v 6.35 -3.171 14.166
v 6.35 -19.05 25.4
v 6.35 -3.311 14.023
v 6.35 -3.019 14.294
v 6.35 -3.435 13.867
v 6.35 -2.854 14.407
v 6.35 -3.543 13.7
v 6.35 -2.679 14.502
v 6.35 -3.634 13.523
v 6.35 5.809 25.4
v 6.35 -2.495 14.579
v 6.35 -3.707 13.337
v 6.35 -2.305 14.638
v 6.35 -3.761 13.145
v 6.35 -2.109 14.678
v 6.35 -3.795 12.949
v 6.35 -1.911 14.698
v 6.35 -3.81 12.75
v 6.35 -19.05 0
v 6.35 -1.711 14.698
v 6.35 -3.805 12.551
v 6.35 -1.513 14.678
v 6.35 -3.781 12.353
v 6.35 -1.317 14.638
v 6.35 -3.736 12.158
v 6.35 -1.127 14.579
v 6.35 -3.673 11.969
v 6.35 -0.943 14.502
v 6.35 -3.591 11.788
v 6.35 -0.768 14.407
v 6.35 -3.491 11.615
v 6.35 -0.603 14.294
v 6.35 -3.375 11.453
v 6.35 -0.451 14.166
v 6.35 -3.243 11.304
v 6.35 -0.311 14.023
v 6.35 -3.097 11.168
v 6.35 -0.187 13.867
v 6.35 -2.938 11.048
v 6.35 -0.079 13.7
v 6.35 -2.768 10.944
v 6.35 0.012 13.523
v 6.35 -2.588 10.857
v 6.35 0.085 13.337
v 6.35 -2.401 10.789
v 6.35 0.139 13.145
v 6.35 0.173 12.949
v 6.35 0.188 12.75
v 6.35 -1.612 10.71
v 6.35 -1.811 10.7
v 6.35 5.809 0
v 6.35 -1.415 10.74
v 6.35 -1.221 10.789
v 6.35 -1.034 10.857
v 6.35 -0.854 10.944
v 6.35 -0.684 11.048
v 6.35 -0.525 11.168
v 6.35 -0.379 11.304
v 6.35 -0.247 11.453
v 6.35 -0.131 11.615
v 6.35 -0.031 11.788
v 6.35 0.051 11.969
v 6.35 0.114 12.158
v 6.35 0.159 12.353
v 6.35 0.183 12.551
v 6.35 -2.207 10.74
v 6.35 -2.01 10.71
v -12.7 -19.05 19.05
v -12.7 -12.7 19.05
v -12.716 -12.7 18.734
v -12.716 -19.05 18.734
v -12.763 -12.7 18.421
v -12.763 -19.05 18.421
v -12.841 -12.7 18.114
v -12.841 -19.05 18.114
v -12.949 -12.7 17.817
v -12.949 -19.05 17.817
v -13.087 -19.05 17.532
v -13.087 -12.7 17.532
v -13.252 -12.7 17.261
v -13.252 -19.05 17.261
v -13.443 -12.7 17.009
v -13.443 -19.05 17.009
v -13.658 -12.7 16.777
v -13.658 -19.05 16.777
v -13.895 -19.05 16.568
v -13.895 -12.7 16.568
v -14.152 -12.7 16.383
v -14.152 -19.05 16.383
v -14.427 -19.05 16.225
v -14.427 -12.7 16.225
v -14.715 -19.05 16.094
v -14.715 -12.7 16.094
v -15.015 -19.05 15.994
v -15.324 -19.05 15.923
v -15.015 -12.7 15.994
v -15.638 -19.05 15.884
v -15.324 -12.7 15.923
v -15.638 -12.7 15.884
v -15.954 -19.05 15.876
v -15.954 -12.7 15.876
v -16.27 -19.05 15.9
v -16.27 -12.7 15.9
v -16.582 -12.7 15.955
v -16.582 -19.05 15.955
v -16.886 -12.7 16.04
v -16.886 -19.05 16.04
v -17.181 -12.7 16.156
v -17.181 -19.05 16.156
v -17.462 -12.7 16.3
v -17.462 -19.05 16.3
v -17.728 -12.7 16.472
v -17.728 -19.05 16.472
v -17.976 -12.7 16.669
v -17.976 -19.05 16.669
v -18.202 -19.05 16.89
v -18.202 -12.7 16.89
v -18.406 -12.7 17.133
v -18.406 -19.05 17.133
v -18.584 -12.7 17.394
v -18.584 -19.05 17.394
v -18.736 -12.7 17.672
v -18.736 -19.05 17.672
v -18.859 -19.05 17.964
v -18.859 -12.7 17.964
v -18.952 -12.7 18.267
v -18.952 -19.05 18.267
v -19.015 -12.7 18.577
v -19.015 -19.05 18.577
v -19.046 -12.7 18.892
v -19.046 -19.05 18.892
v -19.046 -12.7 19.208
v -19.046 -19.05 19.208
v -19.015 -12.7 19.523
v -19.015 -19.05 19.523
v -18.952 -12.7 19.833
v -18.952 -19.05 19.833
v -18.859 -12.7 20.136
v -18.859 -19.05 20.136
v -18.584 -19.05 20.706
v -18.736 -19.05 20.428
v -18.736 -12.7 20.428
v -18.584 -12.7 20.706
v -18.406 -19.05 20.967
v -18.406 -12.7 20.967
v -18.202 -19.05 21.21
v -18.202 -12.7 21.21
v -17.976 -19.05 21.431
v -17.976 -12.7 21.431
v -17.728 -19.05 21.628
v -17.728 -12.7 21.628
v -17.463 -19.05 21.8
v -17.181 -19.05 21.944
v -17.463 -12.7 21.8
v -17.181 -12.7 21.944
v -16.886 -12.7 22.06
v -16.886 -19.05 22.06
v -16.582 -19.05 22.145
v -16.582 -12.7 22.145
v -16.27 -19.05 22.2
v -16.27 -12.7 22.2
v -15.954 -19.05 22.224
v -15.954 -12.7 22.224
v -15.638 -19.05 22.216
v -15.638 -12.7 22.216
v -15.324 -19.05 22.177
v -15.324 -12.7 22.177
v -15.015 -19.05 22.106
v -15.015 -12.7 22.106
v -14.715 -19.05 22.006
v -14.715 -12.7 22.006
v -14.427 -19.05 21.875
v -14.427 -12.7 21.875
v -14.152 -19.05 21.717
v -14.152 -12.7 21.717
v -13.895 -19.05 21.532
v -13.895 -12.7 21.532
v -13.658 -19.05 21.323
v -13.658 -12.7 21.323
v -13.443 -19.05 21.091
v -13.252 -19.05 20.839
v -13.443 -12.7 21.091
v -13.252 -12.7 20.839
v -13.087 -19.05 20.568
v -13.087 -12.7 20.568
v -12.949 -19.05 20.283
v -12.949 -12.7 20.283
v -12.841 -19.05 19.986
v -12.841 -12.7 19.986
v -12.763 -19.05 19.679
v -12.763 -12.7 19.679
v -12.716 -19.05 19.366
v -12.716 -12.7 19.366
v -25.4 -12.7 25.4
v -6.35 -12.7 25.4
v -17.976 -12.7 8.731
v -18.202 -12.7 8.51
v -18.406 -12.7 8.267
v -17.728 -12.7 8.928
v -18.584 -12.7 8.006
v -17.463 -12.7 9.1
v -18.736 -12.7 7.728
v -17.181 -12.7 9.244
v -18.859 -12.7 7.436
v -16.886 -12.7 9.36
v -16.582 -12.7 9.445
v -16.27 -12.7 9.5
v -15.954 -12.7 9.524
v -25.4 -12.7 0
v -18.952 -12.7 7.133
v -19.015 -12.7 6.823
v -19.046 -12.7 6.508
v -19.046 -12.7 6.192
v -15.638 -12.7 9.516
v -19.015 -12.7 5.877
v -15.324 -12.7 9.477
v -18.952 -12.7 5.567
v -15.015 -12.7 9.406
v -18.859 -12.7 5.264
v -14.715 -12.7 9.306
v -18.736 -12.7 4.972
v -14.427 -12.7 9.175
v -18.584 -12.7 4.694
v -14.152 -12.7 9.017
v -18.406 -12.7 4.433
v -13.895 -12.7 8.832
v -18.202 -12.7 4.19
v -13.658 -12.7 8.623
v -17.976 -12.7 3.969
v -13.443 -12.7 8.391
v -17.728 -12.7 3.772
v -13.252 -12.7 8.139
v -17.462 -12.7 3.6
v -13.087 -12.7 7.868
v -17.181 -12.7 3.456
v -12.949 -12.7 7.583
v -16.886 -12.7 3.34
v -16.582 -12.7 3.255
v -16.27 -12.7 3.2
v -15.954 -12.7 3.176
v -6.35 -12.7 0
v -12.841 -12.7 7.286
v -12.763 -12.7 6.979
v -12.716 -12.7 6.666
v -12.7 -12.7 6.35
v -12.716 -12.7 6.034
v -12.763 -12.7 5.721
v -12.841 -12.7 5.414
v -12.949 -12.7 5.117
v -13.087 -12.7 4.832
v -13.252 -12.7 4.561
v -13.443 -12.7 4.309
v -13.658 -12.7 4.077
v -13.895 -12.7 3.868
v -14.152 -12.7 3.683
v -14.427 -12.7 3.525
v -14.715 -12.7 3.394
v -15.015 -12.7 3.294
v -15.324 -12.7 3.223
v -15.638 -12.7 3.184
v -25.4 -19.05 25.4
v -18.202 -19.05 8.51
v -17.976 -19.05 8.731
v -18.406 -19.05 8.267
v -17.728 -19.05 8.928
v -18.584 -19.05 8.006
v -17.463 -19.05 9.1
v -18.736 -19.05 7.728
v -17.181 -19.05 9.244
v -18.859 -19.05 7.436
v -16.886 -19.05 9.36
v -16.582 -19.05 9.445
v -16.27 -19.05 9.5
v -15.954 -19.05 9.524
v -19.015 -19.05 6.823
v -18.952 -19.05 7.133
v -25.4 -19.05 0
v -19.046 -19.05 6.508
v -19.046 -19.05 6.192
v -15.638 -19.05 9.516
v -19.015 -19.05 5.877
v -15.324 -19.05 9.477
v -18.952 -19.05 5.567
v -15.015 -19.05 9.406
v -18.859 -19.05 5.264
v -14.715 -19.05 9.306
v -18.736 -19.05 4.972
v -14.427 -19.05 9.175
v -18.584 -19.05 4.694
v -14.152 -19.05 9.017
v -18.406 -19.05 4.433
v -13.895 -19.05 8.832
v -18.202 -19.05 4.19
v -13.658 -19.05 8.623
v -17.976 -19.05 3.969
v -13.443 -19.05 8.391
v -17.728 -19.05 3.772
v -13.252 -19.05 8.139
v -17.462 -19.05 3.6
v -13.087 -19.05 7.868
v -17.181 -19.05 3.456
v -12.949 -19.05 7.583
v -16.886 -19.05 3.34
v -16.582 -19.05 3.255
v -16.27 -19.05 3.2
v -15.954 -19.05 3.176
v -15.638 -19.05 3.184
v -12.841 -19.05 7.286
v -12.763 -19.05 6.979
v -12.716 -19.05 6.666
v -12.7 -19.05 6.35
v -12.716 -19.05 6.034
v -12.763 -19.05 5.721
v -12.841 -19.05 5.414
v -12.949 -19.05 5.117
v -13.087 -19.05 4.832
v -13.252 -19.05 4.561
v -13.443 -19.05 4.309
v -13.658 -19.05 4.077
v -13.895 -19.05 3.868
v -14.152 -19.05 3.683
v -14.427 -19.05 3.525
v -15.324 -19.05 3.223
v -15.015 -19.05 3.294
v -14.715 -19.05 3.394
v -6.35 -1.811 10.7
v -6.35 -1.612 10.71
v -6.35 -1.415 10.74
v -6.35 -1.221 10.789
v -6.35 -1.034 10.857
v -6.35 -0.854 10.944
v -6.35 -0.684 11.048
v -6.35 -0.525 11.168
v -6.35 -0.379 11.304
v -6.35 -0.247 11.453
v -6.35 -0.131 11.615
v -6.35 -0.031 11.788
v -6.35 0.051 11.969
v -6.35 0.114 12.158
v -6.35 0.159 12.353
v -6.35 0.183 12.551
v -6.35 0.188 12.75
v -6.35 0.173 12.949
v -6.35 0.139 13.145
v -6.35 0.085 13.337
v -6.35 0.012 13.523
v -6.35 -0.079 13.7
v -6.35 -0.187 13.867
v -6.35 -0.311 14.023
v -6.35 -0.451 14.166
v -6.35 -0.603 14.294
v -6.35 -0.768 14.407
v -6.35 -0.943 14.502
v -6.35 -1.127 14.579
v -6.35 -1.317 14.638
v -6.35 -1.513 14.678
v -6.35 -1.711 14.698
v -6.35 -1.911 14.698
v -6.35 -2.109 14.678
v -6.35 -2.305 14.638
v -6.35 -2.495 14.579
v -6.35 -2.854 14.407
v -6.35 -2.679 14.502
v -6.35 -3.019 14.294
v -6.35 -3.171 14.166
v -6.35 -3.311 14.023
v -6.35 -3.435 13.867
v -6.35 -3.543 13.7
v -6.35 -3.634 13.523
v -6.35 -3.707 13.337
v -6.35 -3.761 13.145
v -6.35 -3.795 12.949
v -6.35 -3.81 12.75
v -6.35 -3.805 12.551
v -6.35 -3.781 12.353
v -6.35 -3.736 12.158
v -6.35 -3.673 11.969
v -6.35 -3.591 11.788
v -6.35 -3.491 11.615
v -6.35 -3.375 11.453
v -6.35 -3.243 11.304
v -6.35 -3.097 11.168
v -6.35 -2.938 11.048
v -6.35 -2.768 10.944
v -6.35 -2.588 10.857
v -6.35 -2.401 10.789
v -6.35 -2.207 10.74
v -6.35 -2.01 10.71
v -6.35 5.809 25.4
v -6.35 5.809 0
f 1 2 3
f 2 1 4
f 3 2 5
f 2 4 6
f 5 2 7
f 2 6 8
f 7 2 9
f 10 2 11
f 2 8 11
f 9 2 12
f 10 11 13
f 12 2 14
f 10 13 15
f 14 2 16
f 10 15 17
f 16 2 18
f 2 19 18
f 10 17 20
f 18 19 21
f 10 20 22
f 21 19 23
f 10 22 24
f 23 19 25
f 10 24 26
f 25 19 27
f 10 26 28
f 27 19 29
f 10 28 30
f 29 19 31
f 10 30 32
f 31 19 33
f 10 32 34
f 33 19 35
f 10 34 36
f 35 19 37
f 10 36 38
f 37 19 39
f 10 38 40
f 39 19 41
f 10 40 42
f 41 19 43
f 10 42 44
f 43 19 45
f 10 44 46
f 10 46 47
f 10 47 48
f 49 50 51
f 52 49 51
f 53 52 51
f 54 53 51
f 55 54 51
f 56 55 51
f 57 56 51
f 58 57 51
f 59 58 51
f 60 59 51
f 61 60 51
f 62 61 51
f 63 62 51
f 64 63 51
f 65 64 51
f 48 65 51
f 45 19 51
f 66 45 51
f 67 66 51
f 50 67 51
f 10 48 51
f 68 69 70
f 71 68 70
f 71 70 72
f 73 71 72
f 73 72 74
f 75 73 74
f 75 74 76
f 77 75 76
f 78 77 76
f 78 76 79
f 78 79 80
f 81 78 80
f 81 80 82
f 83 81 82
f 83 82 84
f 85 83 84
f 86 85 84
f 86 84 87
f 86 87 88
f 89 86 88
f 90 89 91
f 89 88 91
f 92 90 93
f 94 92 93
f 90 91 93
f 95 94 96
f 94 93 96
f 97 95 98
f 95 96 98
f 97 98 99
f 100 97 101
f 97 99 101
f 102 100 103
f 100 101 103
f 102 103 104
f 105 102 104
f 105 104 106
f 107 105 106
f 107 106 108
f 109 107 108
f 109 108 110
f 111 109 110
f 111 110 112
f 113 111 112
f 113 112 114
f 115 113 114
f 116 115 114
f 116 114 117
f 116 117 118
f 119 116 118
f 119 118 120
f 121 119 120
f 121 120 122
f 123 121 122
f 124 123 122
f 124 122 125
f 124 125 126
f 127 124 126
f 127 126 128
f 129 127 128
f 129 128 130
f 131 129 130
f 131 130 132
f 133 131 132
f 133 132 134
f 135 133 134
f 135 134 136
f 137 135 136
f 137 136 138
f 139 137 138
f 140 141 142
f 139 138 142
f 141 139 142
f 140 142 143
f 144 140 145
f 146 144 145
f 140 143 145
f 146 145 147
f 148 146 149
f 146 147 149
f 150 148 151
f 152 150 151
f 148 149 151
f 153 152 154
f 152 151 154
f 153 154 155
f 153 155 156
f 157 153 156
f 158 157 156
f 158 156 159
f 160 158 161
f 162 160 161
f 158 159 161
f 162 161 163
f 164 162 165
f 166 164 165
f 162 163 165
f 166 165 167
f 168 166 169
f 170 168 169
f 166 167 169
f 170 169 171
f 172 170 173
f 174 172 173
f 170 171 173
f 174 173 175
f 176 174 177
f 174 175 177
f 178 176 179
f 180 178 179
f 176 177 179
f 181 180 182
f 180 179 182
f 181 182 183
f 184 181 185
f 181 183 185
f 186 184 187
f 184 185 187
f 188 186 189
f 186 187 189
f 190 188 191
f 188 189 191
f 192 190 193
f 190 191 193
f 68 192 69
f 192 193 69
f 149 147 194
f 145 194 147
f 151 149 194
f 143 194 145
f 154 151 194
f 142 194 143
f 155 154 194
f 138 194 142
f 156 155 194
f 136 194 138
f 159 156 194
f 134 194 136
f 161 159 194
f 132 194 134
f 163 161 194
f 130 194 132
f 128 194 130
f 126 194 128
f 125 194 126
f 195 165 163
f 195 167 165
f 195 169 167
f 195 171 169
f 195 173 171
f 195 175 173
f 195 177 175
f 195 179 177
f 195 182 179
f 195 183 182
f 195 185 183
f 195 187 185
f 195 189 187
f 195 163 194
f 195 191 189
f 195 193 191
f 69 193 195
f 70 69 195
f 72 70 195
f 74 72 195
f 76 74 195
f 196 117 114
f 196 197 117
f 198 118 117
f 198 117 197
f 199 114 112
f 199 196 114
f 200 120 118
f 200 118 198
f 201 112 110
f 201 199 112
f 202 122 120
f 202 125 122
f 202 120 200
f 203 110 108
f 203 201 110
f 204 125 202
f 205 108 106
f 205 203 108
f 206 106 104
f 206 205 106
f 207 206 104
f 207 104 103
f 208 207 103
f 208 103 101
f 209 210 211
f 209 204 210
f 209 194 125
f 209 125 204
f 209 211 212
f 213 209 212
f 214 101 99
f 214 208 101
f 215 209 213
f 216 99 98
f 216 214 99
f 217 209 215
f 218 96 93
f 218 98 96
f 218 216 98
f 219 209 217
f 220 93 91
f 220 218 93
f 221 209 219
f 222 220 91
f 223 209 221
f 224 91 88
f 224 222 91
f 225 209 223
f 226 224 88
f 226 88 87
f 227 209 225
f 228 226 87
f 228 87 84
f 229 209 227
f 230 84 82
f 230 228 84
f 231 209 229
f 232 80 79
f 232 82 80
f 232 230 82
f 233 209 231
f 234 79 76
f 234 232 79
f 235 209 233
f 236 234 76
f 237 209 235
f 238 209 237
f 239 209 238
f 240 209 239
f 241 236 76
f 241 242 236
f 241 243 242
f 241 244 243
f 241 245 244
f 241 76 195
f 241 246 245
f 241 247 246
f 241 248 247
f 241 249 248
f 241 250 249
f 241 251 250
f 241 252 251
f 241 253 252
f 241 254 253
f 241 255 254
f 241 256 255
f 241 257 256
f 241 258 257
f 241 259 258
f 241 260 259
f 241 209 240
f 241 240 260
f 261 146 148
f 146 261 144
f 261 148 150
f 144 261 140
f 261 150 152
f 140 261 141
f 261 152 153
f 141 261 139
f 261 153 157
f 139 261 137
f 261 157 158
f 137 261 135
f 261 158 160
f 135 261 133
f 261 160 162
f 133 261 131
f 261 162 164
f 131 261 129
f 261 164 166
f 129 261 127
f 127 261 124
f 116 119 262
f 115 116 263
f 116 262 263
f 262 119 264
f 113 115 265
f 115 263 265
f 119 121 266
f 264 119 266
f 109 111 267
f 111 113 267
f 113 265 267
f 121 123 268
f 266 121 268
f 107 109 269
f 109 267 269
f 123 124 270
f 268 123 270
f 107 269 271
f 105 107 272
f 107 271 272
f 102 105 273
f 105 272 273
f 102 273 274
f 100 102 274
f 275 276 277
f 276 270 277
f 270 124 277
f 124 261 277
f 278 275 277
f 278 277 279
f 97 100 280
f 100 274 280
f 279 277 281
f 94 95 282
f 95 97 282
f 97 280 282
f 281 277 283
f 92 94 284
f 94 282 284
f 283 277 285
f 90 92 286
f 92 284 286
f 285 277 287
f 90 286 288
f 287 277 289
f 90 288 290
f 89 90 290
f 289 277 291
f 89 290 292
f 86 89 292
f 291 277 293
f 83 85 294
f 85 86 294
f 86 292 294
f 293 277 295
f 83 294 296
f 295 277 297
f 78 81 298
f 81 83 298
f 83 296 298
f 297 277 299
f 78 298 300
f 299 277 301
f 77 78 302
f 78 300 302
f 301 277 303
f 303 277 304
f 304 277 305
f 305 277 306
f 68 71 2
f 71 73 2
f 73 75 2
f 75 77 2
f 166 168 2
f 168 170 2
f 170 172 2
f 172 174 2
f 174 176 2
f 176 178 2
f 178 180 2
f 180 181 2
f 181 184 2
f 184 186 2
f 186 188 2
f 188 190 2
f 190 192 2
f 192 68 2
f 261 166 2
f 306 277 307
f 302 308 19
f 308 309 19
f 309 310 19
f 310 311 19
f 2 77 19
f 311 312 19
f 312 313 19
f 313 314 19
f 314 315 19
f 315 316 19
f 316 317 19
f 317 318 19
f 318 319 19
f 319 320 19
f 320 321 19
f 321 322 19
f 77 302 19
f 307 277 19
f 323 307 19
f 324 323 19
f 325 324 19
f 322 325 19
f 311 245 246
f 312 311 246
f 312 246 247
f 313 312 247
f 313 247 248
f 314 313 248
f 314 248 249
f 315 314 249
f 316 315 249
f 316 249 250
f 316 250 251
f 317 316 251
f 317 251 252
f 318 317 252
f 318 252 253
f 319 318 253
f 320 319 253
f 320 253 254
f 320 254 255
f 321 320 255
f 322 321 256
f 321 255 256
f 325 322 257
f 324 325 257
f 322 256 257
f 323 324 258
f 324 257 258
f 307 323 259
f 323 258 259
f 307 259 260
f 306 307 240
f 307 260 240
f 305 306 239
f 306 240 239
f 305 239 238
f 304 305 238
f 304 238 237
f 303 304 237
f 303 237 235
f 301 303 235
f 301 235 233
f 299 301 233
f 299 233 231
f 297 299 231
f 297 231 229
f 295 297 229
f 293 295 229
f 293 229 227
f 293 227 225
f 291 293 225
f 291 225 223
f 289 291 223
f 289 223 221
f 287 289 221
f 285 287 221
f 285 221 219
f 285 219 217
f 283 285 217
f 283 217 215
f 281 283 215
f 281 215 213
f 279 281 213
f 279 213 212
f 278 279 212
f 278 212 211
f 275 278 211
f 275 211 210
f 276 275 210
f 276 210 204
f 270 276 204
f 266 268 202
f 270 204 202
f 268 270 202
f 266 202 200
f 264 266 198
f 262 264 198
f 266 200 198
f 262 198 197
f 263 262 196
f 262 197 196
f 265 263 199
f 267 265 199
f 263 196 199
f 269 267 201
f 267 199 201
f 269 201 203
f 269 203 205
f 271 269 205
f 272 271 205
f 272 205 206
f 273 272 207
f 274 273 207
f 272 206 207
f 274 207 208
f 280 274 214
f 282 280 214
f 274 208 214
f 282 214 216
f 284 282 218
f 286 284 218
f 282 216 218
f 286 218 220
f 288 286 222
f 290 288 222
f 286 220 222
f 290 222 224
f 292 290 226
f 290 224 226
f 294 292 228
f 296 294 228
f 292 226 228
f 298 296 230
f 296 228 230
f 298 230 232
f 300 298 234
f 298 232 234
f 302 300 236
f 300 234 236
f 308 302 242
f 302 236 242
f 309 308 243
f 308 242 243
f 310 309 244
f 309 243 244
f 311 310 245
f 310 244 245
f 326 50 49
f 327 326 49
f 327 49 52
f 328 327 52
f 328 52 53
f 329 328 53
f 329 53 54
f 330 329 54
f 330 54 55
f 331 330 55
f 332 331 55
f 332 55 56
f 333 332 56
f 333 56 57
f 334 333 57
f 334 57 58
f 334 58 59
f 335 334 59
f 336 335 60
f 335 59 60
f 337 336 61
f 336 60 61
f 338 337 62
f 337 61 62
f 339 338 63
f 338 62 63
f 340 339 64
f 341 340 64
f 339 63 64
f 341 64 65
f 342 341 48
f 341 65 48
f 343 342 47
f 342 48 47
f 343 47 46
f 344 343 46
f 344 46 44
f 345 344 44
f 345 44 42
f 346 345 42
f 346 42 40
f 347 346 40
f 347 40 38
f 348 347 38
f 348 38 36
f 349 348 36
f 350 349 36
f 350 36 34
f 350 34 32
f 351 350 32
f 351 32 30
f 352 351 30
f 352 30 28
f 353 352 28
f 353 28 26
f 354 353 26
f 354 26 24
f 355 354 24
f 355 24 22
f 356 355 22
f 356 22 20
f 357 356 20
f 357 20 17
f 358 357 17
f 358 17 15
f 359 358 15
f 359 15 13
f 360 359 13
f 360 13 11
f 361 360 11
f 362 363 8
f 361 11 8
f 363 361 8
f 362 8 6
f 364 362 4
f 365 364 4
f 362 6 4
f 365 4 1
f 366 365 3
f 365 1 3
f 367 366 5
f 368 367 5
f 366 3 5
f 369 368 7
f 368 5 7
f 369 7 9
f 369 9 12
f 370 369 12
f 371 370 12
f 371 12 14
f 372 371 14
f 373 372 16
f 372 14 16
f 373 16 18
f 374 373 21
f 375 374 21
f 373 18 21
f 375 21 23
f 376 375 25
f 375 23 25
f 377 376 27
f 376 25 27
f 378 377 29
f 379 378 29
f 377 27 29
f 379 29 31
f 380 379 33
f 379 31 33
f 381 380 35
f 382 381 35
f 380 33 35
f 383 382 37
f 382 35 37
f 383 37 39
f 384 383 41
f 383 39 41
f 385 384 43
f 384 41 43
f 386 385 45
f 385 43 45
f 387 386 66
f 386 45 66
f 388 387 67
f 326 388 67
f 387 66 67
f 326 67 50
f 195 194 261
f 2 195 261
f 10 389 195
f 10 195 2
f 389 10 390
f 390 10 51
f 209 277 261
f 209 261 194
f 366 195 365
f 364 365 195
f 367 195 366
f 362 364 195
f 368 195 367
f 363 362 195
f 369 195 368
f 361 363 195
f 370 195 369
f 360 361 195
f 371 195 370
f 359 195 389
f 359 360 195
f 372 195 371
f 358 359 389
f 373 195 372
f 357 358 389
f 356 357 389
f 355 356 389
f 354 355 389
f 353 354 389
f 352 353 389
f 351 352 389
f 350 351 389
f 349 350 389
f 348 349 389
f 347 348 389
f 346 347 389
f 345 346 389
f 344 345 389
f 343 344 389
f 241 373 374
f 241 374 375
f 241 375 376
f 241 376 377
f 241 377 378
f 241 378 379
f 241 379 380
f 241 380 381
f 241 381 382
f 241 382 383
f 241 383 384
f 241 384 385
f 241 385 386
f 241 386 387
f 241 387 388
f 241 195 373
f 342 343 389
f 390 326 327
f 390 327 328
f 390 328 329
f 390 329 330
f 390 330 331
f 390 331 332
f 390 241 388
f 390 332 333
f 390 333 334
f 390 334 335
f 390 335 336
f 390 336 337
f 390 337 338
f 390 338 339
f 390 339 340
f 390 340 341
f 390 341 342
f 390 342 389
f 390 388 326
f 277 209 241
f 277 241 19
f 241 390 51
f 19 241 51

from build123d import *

# Parameters (mm, degrees)
SKETCH1_W           = 19.05
SKETCH1_H           = 6.35
SKETCH1_W_2         = 12.7
SKETCH1_H_2         = 38.1
BOSS_EXTRUDE1_DEPTH = 25.4
CUT_EXTRUDE1_REACH  = 8.35
SKETCH2_R           = 3.175
CUT_EXTRUDE2_REACH  = 33.75
SKETCH3_R           = 2
CUT_EXTRUDE3_REACH  = 33.75
SKETCH4_W           = 25.4
SKETCH4_H           = 13.240999966


with BuildPart() as part:
    # Sketch1 → Boss-Extrude1 (new body)
    with BuildSketch(Plane.XY):
        with Locations((-15.875, -15.875)):
            Rectangle(SKETCH1_W, SKETCH1_H)
        Rectangle(SKETCH1_W_2, SKETCH1_H_2)
    extrude(amount=BOSS_EXTRUDE1_DEPTH)

    # Sketch2 → Cut-Extrude1 (cut, up to next)
    with BuildSketch(Plane(origin=(0, -12.7, 0), x_dir=(1, 0, 0), z_dir=(0, 1, 0)), mode=Mode.PRIVATE) as cut_extrude1_sk1:
        with Locations((-15.875, -6.35)):
            Circle(SKETCH2_R)
    cut_extrude1_tool1 = extrude(cut_extrude1_sk1.sketch, amount=-CUT_EXTRUDE1_REACH, mode=Mode.PRIVATE) & part.part
    add(cut_extrude1_tool1.solids().sort_by_distance((-15.875, -12.7, 6.35))[0], mode=Mode.SUBTRACT)
    # Sketch2 → Cut-Extrude1 (cut, up to next)
    with BuildSketch(Plane(origin=(0, -12.7, 0), x_dir=(1, 0, 0), z_dir=(0, 1, 0)), mode=Mode.PRIVATE) as cut_extrude1_sk2:
        with Locations((-15.875, -19.05)):
            Circle(SKETCH2_R)
    cut_extrude1_tool2 = extrude(cut_extrude1_sk2.sketch, amount=-CUT_EXTRUDE1_REACH, mode=Mode.PRIVATE) & part.part
    add(cut_extrude1_tool2.solids().sort_by_distance((-15.875, -12.7, 19.05))[0], mode=Mode.SUBTRACT)

    # Sketch3 → Cut-Extrude2 (cut, up to next)
    with BuildSketch(Plane(origin=(6.35, 0, 0), x_dir=(0, 0, -1), z_dir=(1, 0, 0)), mode=Mode.PRIVATE) as cut_extrude2_sk1:
        with Locations((-12.7, -1.810999966)):
            Circle(SKETCH3_R)
    cut_extrude2_tool1 = extrude(cut_extrude2_sk1.sketch, amount=-CUT_EXTRUDE2_REACH, mode=Mode.PRIVATE) & part.part
    add(cut_extrude2_tool1.solids().sort_by_distance((6.35, -1.811, 12.7))[0], mode=Mode.SUBTRACT)

    # Sketch4 → Cut-Extrude3 (cut, up to next)
    with BuildSketch(Plane(origin=(6.35, 0, 0), x_dir=(0, 0, -1), z_dir=(1, 0, 0)), mode=Mode.PRIVATE) as cut_extrude3_sk1:
        with Locations((-12.7, 12.429500017)):
            Rectangle(SKETCH4_W, SKETCH4_H)
    cut_extrude3_tool1 = extrude(cut_extrude3_sk1.sketch, amount=-CUT_EXTRUDE3_REACH, mode=Mode.PRIVATE) & part.part
    add(cut_extrude3_tool1.solids().sort_by_distance((6.35, 12.4295, 12.7))[0], mode=Mode.SUBTRACT)


solid = part.part
